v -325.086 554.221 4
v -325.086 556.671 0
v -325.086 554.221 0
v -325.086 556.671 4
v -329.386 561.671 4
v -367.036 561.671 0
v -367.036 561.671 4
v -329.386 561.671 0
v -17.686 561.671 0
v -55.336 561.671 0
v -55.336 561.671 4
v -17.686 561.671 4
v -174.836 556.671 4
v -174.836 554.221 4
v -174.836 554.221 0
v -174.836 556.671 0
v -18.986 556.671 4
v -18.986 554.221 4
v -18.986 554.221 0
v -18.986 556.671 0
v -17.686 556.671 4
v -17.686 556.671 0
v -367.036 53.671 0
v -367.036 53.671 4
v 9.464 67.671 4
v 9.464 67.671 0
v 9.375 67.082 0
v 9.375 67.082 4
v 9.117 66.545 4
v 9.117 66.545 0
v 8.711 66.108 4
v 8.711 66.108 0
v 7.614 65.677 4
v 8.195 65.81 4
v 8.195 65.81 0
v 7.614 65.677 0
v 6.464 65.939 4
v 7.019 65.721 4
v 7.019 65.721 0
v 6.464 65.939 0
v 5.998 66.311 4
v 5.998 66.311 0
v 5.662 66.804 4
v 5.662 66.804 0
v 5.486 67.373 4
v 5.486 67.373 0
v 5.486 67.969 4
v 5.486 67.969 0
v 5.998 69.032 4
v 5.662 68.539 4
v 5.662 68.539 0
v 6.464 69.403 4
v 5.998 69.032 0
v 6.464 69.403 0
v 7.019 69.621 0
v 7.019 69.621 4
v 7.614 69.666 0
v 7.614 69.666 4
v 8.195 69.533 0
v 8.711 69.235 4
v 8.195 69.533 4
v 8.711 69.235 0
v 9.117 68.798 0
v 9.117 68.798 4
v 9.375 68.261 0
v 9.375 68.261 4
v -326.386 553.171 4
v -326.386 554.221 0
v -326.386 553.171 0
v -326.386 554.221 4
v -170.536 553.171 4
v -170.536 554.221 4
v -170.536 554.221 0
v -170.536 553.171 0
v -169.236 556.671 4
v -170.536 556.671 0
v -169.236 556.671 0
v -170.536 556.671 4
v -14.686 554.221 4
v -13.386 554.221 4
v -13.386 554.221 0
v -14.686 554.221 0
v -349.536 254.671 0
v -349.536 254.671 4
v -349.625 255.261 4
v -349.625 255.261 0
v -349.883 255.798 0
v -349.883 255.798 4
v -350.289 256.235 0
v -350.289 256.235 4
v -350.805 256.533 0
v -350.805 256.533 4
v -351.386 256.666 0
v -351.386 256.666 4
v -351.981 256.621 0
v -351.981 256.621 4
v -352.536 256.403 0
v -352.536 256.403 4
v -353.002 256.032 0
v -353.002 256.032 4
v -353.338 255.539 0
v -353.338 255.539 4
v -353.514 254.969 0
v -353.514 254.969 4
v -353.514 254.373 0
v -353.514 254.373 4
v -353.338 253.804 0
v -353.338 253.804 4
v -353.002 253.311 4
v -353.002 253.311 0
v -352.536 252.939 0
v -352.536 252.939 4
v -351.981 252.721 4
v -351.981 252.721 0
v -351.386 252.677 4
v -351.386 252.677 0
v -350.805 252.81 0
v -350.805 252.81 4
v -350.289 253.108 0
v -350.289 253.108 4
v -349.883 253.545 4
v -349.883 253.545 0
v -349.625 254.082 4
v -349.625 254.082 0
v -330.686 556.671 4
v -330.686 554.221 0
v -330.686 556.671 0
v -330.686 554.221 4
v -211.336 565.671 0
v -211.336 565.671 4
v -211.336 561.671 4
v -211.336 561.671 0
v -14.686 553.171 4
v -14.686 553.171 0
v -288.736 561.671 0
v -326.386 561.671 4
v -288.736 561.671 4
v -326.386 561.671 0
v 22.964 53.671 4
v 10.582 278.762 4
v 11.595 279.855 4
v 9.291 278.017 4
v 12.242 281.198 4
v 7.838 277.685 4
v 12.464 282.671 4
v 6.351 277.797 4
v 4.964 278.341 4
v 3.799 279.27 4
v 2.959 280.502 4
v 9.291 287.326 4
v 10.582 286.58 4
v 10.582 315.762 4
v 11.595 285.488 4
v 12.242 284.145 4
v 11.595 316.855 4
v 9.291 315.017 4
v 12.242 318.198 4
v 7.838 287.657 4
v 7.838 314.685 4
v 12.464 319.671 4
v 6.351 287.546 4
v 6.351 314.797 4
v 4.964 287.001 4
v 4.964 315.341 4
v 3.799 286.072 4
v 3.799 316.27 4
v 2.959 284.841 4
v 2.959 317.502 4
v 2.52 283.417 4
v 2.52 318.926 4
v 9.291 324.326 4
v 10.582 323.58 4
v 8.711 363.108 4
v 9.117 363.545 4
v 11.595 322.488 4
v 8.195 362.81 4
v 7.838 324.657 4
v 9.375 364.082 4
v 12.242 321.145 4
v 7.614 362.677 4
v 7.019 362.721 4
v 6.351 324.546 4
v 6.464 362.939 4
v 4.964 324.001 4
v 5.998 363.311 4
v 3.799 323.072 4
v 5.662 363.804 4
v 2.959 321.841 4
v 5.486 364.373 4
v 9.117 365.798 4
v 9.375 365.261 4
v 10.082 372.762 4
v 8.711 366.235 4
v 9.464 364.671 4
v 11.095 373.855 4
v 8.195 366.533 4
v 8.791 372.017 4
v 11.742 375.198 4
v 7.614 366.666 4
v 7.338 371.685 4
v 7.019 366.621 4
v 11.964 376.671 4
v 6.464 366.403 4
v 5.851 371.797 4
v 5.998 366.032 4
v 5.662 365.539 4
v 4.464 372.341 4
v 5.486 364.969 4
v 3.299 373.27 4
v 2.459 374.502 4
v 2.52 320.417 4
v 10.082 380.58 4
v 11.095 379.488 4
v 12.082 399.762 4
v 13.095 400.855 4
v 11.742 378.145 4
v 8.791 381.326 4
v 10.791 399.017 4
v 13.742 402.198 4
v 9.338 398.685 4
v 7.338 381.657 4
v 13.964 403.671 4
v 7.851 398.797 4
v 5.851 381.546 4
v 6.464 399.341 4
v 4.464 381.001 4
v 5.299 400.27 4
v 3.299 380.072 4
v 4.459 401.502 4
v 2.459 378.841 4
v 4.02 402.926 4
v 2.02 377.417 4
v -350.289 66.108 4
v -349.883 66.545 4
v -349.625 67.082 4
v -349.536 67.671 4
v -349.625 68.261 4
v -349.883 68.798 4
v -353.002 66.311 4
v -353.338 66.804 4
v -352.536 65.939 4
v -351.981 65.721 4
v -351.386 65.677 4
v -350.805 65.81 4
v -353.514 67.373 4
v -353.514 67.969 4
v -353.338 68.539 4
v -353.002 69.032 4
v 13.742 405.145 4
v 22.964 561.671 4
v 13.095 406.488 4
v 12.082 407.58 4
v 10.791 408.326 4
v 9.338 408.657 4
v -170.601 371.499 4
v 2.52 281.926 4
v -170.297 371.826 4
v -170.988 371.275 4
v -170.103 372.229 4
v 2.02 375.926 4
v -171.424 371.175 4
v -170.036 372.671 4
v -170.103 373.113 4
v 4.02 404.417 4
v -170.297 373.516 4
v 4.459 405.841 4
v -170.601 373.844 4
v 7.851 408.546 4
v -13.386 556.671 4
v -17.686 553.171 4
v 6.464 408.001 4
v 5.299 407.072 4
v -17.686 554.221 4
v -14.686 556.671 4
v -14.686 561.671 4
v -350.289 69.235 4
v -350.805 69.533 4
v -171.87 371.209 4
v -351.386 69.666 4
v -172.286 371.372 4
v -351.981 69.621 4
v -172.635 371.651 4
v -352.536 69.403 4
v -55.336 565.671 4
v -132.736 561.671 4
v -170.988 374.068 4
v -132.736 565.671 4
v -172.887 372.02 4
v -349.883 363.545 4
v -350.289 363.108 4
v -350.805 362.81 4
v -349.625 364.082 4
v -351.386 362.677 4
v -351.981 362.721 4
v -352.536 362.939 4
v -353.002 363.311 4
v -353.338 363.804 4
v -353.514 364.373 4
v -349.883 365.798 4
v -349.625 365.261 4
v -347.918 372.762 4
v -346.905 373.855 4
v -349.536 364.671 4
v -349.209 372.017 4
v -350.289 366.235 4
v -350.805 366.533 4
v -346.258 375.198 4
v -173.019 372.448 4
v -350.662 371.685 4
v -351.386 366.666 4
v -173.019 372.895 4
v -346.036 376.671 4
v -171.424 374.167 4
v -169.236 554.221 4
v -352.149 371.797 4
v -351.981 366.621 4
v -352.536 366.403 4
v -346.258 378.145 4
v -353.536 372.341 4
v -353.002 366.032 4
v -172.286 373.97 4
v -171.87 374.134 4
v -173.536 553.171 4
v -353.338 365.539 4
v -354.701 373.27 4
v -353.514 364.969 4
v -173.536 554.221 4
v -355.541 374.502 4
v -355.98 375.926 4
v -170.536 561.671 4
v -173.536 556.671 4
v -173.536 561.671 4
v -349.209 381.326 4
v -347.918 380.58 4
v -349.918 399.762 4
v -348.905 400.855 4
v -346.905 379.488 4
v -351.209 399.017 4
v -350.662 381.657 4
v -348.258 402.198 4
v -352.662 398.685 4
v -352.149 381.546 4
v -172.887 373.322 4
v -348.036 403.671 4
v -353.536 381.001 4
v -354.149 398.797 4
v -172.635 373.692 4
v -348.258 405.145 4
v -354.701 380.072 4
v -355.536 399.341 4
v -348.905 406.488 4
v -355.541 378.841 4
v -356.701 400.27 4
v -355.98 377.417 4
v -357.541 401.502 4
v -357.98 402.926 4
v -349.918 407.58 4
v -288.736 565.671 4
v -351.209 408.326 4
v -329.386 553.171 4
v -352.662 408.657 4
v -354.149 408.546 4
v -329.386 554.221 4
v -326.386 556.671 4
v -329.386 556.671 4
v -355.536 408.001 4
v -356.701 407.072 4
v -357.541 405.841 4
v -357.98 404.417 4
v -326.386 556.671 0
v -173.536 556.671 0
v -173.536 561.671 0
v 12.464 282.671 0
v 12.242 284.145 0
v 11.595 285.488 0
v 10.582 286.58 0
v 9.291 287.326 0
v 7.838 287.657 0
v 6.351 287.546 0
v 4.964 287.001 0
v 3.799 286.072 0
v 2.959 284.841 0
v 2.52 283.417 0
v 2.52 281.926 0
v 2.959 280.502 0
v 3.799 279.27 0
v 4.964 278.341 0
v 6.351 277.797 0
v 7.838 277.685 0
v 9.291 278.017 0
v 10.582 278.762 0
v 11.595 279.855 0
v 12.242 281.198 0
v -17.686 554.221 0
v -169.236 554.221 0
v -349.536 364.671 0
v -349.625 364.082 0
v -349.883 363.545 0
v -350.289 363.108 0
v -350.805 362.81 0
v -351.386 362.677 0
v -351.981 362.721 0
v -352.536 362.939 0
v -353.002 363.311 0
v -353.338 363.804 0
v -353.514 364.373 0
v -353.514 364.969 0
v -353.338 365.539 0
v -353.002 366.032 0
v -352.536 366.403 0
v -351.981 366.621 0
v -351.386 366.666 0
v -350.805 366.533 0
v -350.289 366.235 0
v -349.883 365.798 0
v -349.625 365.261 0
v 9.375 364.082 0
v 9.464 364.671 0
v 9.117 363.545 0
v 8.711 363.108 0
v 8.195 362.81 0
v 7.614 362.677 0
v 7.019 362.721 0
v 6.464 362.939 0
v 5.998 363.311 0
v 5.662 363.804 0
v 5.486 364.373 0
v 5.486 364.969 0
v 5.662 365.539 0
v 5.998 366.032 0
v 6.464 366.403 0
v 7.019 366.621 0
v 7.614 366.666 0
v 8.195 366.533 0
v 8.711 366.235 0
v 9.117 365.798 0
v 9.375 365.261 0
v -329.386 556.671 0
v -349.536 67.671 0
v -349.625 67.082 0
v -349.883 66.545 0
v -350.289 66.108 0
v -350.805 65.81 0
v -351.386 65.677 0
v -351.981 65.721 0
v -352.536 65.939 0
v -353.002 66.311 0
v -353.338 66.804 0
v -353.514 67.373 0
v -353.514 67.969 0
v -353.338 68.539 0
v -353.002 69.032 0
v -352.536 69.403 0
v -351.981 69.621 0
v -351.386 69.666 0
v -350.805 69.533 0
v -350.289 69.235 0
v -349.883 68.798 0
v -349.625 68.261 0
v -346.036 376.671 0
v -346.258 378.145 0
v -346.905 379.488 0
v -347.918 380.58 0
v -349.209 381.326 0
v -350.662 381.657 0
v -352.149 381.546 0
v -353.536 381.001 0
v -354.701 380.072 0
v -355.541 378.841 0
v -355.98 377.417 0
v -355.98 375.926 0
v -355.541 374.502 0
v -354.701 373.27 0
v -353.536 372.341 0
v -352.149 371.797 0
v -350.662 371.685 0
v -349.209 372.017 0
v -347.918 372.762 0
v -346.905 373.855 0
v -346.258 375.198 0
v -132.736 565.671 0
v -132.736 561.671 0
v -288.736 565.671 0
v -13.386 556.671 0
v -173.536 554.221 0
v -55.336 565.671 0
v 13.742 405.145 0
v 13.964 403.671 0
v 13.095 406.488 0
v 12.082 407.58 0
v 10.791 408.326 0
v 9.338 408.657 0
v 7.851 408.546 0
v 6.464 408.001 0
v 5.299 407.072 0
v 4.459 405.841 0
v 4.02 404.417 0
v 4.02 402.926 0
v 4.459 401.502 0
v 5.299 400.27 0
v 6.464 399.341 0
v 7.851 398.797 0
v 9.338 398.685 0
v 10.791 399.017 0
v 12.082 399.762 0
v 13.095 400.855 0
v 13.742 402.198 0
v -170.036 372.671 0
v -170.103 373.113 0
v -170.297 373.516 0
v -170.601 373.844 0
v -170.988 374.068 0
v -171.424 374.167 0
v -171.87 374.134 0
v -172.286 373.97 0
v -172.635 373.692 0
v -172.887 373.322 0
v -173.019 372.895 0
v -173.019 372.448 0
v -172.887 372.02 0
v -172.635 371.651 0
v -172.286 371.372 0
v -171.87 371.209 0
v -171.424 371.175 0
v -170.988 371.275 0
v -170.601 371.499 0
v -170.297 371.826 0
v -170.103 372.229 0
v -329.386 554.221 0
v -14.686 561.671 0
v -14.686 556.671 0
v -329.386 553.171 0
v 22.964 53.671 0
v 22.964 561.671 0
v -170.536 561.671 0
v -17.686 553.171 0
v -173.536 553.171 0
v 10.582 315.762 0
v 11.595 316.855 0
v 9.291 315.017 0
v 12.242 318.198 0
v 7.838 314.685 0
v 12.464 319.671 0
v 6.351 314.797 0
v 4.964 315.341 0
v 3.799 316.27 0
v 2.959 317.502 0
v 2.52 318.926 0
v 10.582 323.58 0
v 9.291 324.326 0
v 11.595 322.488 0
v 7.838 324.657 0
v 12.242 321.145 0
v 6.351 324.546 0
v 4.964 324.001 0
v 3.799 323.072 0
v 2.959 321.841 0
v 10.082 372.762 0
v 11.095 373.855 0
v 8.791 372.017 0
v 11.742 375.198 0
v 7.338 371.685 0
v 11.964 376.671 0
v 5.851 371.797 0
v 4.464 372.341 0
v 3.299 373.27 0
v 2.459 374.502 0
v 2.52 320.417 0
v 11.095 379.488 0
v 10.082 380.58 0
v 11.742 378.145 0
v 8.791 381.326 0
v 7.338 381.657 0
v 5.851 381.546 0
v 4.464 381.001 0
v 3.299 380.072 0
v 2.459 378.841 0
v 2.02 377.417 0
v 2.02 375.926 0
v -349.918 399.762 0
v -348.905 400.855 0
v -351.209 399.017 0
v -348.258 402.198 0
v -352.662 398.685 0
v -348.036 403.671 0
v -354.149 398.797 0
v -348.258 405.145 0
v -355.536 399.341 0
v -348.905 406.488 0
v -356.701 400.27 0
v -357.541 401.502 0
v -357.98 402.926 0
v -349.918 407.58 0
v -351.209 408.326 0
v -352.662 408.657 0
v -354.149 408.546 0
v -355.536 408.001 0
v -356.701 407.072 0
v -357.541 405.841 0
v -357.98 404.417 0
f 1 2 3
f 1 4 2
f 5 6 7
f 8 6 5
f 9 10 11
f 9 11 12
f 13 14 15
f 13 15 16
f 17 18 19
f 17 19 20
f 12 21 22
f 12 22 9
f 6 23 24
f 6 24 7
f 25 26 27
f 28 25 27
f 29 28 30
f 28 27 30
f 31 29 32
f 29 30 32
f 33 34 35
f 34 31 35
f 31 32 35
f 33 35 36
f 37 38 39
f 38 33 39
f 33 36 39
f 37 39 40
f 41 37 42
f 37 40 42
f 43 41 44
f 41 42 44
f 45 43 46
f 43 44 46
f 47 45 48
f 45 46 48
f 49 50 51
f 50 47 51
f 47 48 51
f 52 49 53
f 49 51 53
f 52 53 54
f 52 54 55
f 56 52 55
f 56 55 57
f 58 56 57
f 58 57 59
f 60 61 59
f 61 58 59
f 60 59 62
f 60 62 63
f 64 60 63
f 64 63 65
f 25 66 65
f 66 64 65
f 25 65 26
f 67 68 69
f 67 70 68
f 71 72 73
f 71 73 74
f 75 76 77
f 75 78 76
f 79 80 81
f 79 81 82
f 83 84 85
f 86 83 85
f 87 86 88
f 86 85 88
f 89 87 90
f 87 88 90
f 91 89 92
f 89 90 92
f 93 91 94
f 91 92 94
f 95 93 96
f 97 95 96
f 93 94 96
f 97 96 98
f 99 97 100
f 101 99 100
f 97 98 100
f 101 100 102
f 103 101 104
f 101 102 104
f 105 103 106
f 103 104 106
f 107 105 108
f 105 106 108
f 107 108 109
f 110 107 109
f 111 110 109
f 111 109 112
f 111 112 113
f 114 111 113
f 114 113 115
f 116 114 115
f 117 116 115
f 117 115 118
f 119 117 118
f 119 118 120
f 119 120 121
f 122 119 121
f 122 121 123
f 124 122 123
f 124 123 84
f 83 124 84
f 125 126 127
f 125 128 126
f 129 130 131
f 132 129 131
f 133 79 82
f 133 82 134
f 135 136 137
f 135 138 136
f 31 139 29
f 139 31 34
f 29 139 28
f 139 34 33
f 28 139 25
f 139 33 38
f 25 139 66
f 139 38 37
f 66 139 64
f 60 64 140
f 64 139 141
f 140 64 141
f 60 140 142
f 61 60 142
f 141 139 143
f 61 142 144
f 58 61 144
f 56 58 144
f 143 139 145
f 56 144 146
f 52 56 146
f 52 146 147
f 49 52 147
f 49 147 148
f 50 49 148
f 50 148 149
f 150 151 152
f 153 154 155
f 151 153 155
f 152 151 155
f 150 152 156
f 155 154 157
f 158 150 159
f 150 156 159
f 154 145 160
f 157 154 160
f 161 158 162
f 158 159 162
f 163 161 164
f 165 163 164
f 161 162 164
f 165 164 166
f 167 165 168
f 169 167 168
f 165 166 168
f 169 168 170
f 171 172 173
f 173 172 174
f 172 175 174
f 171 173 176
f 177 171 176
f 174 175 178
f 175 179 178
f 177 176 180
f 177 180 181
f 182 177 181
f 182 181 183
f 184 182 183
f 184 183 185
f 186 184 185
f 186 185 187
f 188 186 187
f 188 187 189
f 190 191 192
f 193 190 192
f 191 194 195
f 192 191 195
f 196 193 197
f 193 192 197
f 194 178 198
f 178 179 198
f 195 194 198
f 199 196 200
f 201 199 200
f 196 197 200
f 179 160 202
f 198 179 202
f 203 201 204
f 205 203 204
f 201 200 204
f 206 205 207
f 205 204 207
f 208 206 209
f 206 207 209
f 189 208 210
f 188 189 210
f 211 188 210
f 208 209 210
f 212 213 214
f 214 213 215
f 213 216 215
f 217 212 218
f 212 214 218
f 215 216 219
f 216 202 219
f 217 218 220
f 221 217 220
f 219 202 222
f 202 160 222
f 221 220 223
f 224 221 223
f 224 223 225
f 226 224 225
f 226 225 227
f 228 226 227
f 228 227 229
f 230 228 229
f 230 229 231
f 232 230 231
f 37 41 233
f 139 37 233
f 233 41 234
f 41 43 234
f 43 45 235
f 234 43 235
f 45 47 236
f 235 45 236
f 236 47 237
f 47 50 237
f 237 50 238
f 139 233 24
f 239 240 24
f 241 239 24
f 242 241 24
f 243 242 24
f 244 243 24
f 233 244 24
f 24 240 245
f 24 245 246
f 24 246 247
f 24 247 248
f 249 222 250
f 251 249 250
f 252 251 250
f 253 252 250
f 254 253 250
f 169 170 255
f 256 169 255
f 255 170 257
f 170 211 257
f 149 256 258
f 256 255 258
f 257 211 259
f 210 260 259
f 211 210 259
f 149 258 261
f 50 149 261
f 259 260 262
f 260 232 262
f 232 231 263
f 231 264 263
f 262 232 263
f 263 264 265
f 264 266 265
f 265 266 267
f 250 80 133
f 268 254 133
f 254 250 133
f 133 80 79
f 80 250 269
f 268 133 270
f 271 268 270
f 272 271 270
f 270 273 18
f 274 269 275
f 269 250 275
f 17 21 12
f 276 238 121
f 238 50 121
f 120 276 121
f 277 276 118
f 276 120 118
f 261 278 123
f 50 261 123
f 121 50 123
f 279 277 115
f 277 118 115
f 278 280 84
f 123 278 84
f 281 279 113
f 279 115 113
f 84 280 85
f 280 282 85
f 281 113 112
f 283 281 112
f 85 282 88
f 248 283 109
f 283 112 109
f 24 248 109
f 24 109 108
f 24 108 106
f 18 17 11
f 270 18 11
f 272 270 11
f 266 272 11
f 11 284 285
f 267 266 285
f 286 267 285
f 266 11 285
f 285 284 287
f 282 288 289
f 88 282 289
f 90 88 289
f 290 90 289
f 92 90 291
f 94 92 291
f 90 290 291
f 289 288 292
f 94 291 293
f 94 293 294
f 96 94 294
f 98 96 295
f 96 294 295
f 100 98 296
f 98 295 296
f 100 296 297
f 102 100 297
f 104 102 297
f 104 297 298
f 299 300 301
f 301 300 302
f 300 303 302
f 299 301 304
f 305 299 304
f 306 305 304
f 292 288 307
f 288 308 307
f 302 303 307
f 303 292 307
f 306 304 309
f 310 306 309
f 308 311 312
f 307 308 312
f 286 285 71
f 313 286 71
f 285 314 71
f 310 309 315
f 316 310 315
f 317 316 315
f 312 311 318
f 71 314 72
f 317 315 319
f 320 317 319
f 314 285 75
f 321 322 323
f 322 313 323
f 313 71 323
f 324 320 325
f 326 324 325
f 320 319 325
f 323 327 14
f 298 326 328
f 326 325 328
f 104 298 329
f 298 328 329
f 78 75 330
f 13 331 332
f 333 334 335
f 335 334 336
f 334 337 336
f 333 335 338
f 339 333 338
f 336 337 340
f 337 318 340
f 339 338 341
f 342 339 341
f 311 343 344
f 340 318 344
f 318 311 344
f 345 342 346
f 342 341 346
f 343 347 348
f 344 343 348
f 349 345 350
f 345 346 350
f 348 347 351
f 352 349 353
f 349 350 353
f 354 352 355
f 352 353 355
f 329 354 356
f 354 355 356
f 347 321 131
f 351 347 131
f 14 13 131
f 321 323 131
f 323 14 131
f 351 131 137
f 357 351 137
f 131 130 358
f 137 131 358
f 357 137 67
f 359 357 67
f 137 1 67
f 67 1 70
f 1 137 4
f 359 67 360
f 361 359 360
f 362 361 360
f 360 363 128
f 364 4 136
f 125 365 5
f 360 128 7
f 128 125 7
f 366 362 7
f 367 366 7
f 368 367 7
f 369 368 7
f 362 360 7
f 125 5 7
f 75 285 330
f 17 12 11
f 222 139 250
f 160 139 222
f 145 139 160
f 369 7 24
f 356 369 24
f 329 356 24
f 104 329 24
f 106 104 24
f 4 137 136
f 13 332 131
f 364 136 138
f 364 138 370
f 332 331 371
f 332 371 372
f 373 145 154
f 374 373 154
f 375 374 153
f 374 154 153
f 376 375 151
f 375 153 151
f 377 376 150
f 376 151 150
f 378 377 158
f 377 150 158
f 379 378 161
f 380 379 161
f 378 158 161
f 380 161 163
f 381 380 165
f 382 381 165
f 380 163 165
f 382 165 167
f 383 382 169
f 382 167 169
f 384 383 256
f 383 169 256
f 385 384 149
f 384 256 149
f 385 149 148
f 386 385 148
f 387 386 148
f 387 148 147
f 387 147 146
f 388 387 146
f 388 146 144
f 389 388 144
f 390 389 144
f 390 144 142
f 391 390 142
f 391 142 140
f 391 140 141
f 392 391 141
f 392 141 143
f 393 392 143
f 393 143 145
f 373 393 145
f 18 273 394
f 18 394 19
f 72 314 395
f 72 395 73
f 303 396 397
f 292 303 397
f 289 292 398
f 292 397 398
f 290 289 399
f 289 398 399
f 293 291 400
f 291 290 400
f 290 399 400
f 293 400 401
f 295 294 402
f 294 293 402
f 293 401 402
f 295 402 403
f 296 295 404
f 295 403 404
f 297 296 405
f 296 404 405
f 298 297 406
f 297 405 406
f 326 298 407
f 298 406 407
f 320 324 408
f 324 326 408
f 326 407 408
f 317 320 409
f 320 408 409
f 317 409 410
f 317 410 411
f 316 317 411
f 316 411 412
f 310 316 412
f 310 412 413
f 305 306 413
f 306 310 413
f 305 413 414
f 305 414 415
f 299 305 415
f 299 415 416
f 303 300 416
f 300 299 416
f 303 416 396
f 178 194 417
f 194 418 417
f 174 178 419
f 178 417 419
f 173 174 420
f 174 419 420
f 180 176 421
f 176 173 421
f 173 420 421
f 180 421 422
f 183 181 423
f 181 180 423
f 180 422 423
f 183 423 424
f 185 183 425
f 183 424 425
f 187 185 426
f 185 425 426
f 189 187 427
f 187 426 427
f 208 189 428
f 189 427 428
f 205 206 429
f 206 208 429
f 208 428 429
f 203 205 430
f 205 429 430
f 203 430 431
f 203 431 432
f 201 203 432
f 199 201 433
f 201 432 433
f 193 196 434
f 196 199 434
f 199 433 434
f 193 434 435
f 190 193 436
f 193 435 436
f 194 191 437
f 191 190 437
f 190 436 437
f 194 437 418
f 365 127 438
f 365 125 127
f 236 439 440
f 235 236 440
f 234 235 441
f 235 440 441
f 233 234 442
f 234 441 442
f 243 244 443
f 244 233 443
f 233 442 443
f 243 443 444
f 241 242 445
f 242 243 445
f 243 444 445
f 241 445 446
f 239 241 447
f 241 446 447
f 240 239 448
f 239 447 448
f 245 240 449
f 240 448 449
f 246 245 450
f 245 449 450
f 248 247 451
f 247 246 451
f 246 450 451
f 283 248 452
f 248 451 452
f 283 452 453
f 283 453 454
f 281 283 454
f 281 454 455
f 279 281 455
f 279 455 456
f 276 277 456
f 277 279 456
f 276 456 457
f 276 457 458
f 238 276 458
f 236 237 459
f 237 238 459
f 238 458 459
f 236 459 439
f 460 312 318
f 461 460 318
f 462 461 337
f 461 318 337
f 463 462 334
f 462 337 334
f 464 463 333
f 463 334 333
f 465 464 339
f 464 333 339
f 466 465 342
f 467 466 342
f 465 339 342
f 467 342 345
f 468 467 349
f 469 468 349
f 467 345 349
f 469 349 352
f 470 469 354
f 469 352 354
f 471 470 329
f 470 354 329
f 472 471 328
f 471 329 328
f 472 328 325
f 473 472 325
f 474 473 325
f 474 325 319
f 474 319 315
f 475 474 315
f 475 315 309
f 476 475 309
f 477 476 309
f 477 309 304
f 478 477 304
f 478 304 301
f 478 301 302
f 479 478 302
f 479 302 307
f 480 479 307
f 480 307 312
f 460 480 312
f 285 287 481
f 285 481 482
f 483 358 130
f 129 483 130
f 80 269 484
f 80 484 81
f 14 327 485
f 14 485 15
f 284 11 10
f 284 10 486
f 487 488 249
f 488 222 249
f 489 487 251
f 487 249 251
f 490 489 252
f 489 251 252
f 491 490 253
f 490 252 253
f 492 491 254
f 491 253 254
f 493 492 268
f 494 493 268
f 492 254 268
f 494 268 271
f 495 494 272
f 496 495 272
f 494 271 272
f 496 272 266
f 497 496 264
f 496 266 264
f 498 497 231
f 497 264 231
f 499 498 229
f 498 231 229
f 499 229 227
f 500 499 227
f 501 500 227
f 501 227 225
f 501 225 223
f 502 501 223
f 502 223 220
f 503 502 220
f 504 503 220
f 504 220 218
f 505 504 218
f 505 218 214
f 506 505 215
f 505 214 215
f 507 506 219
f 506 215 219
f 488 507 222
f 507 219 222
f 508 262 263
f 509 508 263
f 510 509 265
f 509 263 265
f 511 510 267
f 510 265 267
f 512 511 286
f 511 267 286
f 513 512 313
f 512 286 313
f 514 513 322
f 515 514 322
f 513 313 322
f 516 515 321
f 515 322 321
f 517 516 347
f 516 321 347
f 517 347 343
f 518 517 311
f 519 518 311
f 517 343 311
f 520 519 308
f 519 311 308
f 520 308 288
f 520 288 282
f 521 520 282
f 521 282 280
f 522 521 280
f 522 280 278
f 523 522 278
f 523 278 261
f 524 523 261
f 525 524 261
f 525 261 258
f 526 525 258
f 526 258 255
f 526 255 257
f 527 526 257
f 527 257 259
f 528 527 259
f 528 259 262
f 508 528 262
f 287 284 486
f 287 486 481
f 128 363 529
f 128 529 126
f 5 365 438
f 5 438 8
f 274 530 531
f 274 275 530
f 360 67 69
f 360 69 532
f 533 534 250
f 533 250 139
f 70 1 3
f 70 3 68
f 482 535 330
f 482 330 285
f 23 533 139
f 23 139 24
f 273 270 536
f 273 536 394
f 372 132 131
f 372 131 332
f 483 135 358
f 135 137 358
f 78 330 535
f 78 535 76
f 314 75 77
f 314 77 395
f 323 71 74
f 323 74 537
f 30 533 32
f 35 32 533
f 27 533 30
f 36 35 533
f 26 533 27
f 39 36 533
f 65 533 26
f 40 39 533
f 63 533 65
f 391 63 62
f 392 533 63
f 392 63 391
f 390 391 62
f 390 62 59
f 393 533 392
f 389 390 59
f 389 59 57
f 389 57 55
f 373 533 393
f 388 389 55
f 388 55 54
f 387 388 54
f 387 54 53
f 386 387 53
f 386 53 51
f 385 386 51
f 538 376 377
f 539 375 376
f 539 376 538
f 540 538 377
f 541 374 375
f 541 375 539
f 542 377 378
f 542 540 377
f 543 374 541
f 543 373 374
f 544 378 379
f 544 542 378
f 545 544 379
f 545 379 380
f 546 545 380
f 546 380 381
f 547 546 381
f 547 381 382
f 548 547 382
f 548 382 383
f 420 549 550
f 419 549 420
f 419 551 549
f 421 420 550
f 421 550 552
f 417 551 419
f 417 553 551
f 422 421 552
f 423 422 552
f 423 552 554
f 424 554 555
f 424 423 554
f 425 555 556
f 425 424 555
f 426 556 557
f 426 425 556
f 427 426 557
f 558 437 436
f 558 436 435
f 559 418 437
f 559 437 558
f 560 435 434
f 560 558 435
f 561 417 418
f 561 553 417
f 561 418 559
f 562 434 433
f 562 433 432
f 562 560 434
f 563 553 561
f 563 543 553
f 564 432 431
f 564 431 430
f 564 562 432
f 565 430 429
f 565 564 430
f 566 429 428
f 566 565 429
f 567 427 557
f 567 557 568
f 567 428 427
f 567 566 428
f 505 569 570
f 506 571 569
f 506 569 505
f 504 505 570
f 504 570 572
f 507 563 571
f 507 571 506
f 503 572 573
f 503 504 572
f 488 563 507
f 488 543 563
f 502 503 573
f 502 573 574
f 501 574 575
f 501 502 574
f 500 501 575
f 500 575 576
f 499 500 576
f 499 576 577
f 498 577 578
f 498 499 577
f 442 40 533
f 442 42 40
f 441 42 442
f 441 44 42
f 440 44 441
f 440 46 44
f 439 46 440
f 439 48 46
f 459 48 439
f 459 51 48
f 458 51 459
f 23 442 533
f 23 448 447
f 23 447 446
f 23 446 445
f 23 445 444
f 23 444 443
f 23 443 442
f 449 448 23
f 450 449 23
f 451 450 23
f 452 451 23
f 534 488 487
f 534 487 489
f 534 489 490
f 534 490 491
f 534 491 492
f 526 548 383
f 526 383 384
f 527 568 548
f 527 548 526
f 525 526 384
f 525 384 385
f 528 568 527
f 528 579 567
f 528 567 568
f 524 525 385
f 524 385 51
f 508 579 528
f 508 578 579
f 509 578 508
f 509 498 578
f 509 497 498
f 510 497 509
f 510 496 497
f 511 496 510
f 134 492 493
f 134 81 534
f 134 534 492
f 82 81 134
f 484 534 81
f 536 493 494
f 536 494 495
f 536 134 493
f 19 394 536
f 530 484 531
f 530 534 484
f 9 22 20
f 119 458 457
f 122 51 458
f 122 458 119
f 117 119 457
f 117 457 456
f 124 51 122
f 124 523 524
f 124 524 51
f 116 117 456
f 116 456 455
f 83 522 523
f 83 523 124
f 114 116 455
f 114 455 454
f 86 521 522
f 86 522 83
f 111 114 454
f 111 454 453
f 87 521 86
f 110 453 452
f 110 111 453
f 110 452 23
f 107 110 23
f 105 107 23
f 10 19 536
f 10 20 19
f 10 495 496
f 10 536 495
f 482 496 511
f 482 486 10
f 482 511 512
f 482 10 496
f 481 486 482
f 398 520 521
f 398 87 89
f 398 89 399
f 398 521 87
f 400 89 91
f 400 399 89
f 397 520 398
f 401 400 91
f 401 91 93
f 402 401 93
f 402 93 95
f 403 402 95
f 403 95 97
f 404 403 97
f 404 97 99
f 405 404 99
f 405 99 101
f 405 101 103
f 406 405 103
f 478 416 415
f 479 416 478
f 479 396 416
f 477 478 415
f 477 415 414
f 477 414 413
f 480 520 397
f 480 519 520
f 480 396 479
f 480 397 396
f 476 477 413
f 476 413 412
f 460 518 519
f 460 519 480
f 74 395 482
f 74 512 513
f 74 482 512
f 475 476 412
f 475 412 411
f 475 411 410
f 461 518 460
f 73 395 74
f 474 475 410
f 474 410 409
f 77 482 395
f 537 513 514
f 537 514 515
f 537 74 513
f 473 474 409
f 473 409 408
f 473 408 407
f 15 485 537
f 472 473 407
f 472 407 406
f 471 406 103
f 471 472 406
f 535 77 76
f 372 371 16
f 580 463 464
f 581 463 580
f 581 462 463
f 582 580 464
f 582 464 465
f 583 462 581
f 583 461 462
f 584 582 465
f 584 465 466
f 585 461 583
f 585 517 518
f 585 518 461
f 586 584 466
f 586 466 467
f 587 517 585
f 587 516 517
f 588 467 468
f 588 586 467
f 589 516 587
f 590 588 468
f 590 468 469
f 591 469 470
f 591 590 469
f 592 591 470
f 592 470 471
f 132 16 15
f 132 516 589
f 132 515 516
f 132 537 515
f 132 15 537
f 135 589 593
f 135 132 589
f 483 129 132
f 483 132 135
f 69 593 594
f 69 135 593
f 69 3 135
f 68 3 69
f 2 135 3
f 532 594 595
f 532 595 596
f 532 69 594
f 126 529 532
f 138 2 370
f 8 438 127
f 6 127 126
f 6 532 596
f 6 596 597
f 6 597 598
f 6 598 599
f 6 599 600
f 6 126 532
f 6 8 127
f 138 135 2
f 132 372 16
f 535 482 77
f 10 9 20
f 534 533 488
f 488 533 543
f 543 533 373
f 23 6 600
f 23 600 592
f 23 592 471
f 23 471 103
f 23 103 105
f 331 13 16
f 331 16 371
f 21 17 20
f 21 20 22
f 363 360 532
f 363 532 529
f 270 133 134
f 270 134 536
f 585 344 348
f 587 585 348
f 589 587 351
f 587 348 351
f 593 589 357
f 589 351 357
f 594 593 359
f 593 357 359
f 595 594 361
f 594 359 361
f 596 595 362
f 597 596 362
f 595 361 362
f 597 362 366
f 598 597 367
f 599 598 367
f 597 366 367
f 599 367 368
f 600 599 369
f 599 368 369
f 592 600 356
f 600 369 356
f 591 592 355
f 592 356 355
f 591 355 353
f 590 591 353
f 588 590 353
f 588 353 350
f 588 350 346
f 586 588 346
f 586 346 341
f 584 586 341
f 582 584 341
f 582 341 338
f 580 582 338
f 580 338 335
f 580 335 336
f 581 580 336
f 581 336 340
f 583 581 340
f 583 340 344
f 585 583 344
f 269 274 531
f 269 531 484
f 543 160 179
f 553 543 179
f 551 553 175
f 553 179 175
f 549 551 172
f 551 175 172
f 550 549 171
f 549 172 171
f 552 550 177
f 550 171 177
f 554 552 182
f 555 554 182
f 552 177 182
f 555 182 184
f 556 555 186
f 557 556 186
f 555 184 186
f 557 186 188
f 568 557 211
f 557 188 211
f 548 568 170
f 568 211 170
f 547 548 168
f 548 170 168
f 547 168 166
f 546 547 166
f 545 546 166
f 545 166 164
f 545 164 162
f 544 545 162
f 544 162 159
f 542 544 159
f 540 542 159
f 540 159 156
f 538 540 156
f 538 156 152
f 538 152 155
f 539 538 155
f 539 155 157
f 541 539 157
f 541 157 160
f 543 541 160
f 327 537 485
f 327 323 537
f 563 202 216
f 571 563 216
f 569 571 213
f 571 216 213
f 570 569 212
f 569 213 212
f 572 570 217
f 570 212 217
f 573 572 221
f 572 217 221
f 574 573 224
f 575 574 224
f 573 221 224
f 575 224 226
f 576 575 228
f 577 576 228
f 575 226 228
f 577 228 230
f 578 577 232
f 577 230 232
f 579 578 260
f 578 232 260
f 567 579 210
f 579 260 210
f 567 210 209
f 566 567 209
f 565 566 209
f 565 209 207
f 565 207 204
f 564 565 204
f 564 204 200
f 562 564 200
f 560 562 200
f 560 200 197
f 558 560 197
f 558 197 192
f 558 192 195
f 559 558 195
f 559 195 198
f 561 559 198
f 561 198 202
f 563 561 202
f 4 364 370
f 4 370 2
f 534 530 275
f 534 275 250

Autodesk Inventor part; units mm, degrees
ref_plane "YZ Plane" through (0, 0, 0) normal (1, 0, 0) x (0, 1, 0)
ref_plane "XZ Plane" through (0, 0, 0) normal (0, 1, 0) x (-1, 0, 0)
ref_plane "XY Plane" through (0, 0, 0) normal (0, 0, 1) x (1, 0, 0)
sketch "Эскиз1" plane through (0, 0, 0) normal (0, 0, 1) x (1, 0, 0)
  circle A0 centre (7.4641, 67.6713) radius 2
  circle A1 centre (7.4641, 364.6713) radius 2
  circle A2 centre (-351.5359, 364.6713) radius 2
  circle A3 centre (-351.5359, 67.6713) radius 2
  line L0 (-359.0359, 370.6713) -> (14.9641, 370.6713)
  line L1 (14.9641, 370.6713) -> (14.9641, 53.6713)
  line L2 (14.9641, 53.6713) -> (-359.0359, 53.6713)
  line L3 (-359.0359, 53.6713) -> (-359.0359, 370.6713)
  line L4 (-359.0359, 370.6713) -> (-367.0359, 370.6713)
  line L5 (-367.0359, 370.6713) -> (-367.0359, 53.6713)
  line L6 (-367.0359, 53.6713) -> (-359.0359, 53.6713)
  line L7 (-359.0359, 53.6713) -> (-359.0359, 370.6713)
  line L8 (14.9641, 370.6713) -> (22.9641, 370.6713)
  line L9 (22.9641, 370.6713) -> (22.9641, 53.6713)
  line L10 (22.9641, 53.6713) -> (14.9641, 53.6713)
  line L11 (14.9641, 53.6713) -> (14.9641, 370.6713)
  dimension "d4" = 374
  dimension "d6" = 317
  dimension "d7" = 14
  dimension "d40" = 7.5
  dimension "d41" = 297
  dimension "d42" = 7.5
  dimension "d43" = 7.5
  dimension "d44" = 297
  dimension "d45" = 6
  dimension "d46" = 359
  dimension "d47" = 14
  dimension "d48" = 359
  dimension "d66" = 8
  dimension "d67" = 8
  dimension "d68" = 390
  dimension "d92" = 4
  dimension "d93" = 4
  dimension "d94" = 4
  dimension "d95" = 4
extrude "Выдавливание1" add sketch "Эскиз1" along normal blind 4
sketch "Эскиз3" plane through (0, 0, 4) normal (0, 0, 1) x (1, 0, 0)
  circle A0 centre (7.4641, 319.6713) radius 5
  circle A1 centre (7.4641, 282.6713) radius 5
  circle A2 centre (-351.5359, 254.6713) radius 2
  point P0 (0, 0)
  dimension "d96" = 10
  dimension "d97" = 10
sketch "Эскиз4" plane through (0, 0, 4) normal (0, 0, 1) x (1, 0, 0)
  circle A0 centre (-171.5359, 372.6713) radius 1.5
  line L0 (-182.5359, 370.6713) -> (-179.0359, 378.6713)
  line L1 (-179.0359, 378.6713) -> (-164.0359, 378.6713)
  line L2 (-164.0359, 378.6713) -> (-160.5359, 370.6713)
  line L3 (22.9641, 370.6713) -> (-367.0359, 370.6713)
  line L4 (-171.5359, 372.6713) -> (-171.5359, 378.6713)
  circle A1 centre (-171.5359, 372.6713) radius 1.5
  point P0 (0, 0)
  point P1 (10.9641, 370.6713)
  point P2 (-363.0359, 370.6713)
  dimension "d49" = 8
  dimension "d50" = 22
  dimension "d51" = 15
sketch "Эскиз5" plane through (0, 0, 0) normal (0, 0, -1) x (-1, 0, 0)
  line L0 (-22.9641, 370.6713) -> (367.0359, 370.6713)
  line L1 (-22.9641, 370.6713) -> (367.0359, 370.6713)
  line L2 (367.0359, 370.6713) -> (367.0359, 561.6713)
  line L3 (367.0359, 561.6713) -> (-22.9641, 561.6713)
  line L4 (-22.9641, 561.6713) -> (-22.9641, 370.6713)
  line L5 (367.0359, 370.6713) -> (367.0359, 53.6713)
  line L6 (-22.9641, 53.6713) -> (-22.9641, 370.6713)
  point P0 (0, 0)
  point P1 (363.0359, 370.6713)
  dimension "d69" = 390
  dimension "d70" = 191
extrude "Выдавливание4" add sketch "Эскиз5" against normal blind 4
extrude "Выдавливание5" cut sketch "Эскиз3" against normal blind 4
extrude "Выдавливание6" cut sketch "Эскиз4" against normal blind 5 contours A0
sketch "Эскиз7" plane through (0, 0, 4) normal (0, 0, 1) x (1, 0, 0)
  circle A0 centre (-353.0359, 403.6713) radius 3.75 construction
  circle A1 centre (-351.0359, 376.6713) radius 3.75 construction
  circle A2 centre (8.9641, 403.6713) radius 3.75 construction
  circle A3 centre (6.9641, 376.6713) radius 3.75 construction
  circle A4 centre (8.9641, 403.6713) radius 5
  circle A5 centre (6.9641, 376.6713) radius 5
  circle A6 centre (-353.0359, 403.6713) radius 5
  circle A7 centre (-351.0359, 376.6713) radius 5
  point P0 (0, 0)
  dimension "d71" = 10
  dimension "d72" = 10
  dimension "d73" = 10
  dimension "d74" = 10
extrude "Выдавливание8" cut sketch "Эскиз7" against normal blind 10
sketch "Эскиз8" plane through (0, 0, 4) normal (0, 0, 1) x (1, 0, 0)
  line L0 (-367.0359, 53.6713) -> (-367.0359, 561.6713)
  line L1 (-367.0359, 561.6713) -> (-289.0359, 561.6713)
  line L2 (-289.0359, 561.6713) -> (-289.0359, 565.6713)
  line L3 (-289.0359, 565.6713) -> (-367.0359, 565.6713)
  line L4 (-367.0359, 565.6713) -> (-367.0359, 561.6713)
  line L5 (-367.0359, 561.6713) -> (22.9641, 561.6713)
  line L6 (-288.7359, 565.6713) -> (-211.3359, 565.6713)
  line L7 (-211.3359, 565.6713) -> (-211.3359, 561.6713)
  line L8 (-211.3359, 561.6713) -> (-288.7359, 561.6713)
  line L9 (-288.7359, 561.6713) -> (-288.7359, 565.6713)
  line L10 (-211.0359, 565.6713) -> (-133.0359, 565.6713)
  line L11 (-133.0359, 565.6713) -> (-133.0359, 561.6713)
  line L12 (-133.0359, 561.6713) -> (-211.0359, 561.6713)
  line L13 (-211.0359, 561.6713) -> (-211.0359, 565.6713)
  line L14 (22.9641, 561.6713) -> (-367.0359, 561.6713)
  line L15 (-132.7359, 561.6713) -> (-55.3359, 561.6713)
  line L16 (-55.3359, 561.6713) -> (-55.3359, 565.6713)
  line L17 (-55.3359, 565.6713) -> (-132.7359, 565.6713)
  line L18 (-132.7359, 565.6713) -> (-132.7359, 561.6713)
  line L19 (22.9641, 561.6713) -> (-55.0359, 561.6713)
  line L20 (-55.0359, 561.6713) -> (-55.0359, 565.6713)
  line L21 (-55.0359, 565.6713) -> (22.9641, 565.6713)
  line L22 (22.9641, 565.6713) -> (22.9641, 561.6713)
  point P0 (0, 0)
  dimension "d77" = 78
  dimension "d78" = 4
  dimension "d79" = 4
  dimension "d80" = 0.3
  dimension "d81" = 0.3
  dimension "d82" = 77.4
  dimension "d83" = 78
  dimension "d84" = 0.3
  dimension "d85" = 4
  dimension "d86" = 77.4
  dimension "d87" = 4
  dimension "d88" = 0.3
  dimension "d89" = 78
extrude "Выдавливание9" add sketch "Эскиз8" against normal blind 4 contours L18 L17 L16 L5 | L9 L6 L7 L5
sketch "Эскиз10" plane through (0, 0, 4) normal (0, 0, 1) x (1, 0, 0)
  line L0 (-329.3859, 556.6713) -> (-329.3859, 561.6713)
  line L1 (-330.6859, 556.6713) -> (-329.3859, 556.6713)
  line L2 (-330.6859, 554.2213) -> (-330.6859, 556.6713)
  line L3 (-329.3859, 554.2213) -> (-330.6859, 554.2213)
  line L4 (-326.3859, 553.1713) -> (-329.3859, 553.1713)
  line L5 (-329.3859, 553.1713) -> (-329.3859, 554.2213)
  line L6 (-326.3859, 554.2213) -> (-326.3859, 553.1713)
  line L7 (-325.0859, 554.2213) -> (-326.3859, 554.2213)
  line L8 (-325.0859, 556.6713) -> (-325.0859, 554.2213)
  line L9 (-326.3859, 556.6713) -> (-325.0859, 556.6713)
  line L10 (-326.3859, 561.6713) -> (-326.3859, 556.6713)
  line L11 (-173.5359, 556.6713) -> (-173.5359, 561.6713)
  line L12 (-170.5359, 561.6713) -> (-170.5359, 556.6713)
  line L13 (-174.8359, 556.6713) -> (-173.5359, 556.6713)
  line L14 (-174.8359, 554.2213) -> (-174.8359, 556.6713)
  line L15 (-173.5359, 554.2213) -> (-174.8359, 554.2213)
  line L16 (-173.5359, 553.1713) -> (-173.5359, 554.2213)
  line L17 (-170.5359, 553.1713) -> (-173.5359, 553.1713)
  circle A0 centre (-353.0359, 403.6713) radius 5
  circle A1 centre (8.9641, 403.6713) radius 5
  circle A2 centre (6.9641, 376.6713) radius 5
  circle A3 centre (-351.0359, 376.6713) radius 5
  circle A4 centre (-171.5359, 372.6713) radius 1.5
  circle A5 centre (7.4641, 319.6713) radius 5
  circle A6 centre (-351.5359, 254.6713) radius 2
  circle A7 centre (7.4641, 282.6713) radius 5
  circle A8 centre (-351.5359, 67.6713) radius 2
  circle A9 centre (-351.5359, 364.6713) radius 2
  circle A10 centre (7.4641, 364.6713) radius 2
  circle A11 centre (7.4641, 67.6713) radius 2
  line L18 (-367.0359, 561.6713) -> (-367.0359, 53.6713)
  line L19 (-367.0359, 53.6713) -> (22.9641, 53.6713)
  line L20 (22.9641, 53.6713) -> (22.9641, 561.6713)
  line L21 (22.9641, 561.6713) -> (-55.3359, 561.6713)
  line L22 (-55.3359, 561.6713) -> (-55.3359, 565.6713)
  line L23 (-55.3359, 565.6713) -> (-132.7359, 565.6713)
  line L24 (-132.7359, 565.6713) -> (-132.7359, 561.6713)
  line L25 (-132.7359, 561.6713) -> (-211.3359, 561.6713)
  line L26 (-211.3359, 561.6713) -> (-211.3359, 565.6713)
  line L27 (-211.3359, 565.6713) -> (-288.7359, 565.6713)
  line L28 (-288.7359, 565.6713) -> (-288.7359, 561.6713)
  line L29 (-288.7359, 561.6713) -> (-367.0359, 561.6713)
  line L30 (-169.2359, 554.2213) -> (-170.5359, 554.2213)
  line L31 (-169.2359, 556.6713) -> (-169.2359, 554.2213)
  line L32 (-170.5359, 556.6713) -> (-169.2359, 556.6713)
  line L33 (-170.5359, 554.2213) -> (-170.5359, 553.1713)
  line L34 (-17.6859, 556.6713) -> (-17.6859, 561.6713)
  line L35 (-14.6859, 561.6713) -> (-14.6859, 556.6713)
  line L36 (-14.6859, 556.6713) -> (-13.3859, 556.6713)
  line L37 (-13.3859, 556.6713) -> (-13.3859, 554.2213)
  line L38 (-13.3859, 554.2213) -> (-14.6859, 554.2213)
  line L39 (-14.6859, 554.2213) -> (-14.6859, 553.1713)
  line L40 (-14.6859, 553.1713) -> (-17.6859, 553.1713)
  line L41 (-17.6859, 553.1713) -> (-17.6859, 554.2213)
  line L42 (-17.6859, 554.2213) -> (-18.9859, 554.2213)
  line L43 (-18.9859, 554.2213) -> (-18.9859, 556.6713)
  line L44 (-18.9859, 556.6713) -> (-17.6859, 556.6713)
  line L45 (-17.6859, 561.6713) -> (-14.6859, 561.6713)
  line L46 (-55.3359, 561.6713) -> (22.9641, 561.6713)
  line L47 (-173.5359, 561.6713) -> (-170.5359, 561.6713)
  line L48 (-329.3859, 561.6713) -> (-326.3859, 561.6713)
  line L49 (-288.7359, 561.6713) -> (-367.0359, 561.6713)
  point P0 (0, 0)
  dimension "d100" = 1.3
  dimension "d101" = 1.3
  dimension "d102" = 1.3
  dimension "d103" = 1.3
  dimension "d104" = 1.3
  dimension "d105" = 1.3
  dimension "d106" = 5
  dimension "d107" = 1.3
  dimension "d108" = 2.45
  dimension "d109" = 8.5
  dimension "d110" = 8.5
  dimension "d111" = 8.5
extrude "Выдавливание10" cut sketch "Эскиз10" against normal blind 10 contours L0 L29 L10 L9 L8 L7 L6 L4 L5 L3 L2 L1 | L35 L36 L37 L38 L39 L40 L41 L42 L43 L44 L34 L21 | L25 L12 L32 L31 L30 L33 L17 L16 L15 L14 L13 L11
properties part number "задняя  панель new"
